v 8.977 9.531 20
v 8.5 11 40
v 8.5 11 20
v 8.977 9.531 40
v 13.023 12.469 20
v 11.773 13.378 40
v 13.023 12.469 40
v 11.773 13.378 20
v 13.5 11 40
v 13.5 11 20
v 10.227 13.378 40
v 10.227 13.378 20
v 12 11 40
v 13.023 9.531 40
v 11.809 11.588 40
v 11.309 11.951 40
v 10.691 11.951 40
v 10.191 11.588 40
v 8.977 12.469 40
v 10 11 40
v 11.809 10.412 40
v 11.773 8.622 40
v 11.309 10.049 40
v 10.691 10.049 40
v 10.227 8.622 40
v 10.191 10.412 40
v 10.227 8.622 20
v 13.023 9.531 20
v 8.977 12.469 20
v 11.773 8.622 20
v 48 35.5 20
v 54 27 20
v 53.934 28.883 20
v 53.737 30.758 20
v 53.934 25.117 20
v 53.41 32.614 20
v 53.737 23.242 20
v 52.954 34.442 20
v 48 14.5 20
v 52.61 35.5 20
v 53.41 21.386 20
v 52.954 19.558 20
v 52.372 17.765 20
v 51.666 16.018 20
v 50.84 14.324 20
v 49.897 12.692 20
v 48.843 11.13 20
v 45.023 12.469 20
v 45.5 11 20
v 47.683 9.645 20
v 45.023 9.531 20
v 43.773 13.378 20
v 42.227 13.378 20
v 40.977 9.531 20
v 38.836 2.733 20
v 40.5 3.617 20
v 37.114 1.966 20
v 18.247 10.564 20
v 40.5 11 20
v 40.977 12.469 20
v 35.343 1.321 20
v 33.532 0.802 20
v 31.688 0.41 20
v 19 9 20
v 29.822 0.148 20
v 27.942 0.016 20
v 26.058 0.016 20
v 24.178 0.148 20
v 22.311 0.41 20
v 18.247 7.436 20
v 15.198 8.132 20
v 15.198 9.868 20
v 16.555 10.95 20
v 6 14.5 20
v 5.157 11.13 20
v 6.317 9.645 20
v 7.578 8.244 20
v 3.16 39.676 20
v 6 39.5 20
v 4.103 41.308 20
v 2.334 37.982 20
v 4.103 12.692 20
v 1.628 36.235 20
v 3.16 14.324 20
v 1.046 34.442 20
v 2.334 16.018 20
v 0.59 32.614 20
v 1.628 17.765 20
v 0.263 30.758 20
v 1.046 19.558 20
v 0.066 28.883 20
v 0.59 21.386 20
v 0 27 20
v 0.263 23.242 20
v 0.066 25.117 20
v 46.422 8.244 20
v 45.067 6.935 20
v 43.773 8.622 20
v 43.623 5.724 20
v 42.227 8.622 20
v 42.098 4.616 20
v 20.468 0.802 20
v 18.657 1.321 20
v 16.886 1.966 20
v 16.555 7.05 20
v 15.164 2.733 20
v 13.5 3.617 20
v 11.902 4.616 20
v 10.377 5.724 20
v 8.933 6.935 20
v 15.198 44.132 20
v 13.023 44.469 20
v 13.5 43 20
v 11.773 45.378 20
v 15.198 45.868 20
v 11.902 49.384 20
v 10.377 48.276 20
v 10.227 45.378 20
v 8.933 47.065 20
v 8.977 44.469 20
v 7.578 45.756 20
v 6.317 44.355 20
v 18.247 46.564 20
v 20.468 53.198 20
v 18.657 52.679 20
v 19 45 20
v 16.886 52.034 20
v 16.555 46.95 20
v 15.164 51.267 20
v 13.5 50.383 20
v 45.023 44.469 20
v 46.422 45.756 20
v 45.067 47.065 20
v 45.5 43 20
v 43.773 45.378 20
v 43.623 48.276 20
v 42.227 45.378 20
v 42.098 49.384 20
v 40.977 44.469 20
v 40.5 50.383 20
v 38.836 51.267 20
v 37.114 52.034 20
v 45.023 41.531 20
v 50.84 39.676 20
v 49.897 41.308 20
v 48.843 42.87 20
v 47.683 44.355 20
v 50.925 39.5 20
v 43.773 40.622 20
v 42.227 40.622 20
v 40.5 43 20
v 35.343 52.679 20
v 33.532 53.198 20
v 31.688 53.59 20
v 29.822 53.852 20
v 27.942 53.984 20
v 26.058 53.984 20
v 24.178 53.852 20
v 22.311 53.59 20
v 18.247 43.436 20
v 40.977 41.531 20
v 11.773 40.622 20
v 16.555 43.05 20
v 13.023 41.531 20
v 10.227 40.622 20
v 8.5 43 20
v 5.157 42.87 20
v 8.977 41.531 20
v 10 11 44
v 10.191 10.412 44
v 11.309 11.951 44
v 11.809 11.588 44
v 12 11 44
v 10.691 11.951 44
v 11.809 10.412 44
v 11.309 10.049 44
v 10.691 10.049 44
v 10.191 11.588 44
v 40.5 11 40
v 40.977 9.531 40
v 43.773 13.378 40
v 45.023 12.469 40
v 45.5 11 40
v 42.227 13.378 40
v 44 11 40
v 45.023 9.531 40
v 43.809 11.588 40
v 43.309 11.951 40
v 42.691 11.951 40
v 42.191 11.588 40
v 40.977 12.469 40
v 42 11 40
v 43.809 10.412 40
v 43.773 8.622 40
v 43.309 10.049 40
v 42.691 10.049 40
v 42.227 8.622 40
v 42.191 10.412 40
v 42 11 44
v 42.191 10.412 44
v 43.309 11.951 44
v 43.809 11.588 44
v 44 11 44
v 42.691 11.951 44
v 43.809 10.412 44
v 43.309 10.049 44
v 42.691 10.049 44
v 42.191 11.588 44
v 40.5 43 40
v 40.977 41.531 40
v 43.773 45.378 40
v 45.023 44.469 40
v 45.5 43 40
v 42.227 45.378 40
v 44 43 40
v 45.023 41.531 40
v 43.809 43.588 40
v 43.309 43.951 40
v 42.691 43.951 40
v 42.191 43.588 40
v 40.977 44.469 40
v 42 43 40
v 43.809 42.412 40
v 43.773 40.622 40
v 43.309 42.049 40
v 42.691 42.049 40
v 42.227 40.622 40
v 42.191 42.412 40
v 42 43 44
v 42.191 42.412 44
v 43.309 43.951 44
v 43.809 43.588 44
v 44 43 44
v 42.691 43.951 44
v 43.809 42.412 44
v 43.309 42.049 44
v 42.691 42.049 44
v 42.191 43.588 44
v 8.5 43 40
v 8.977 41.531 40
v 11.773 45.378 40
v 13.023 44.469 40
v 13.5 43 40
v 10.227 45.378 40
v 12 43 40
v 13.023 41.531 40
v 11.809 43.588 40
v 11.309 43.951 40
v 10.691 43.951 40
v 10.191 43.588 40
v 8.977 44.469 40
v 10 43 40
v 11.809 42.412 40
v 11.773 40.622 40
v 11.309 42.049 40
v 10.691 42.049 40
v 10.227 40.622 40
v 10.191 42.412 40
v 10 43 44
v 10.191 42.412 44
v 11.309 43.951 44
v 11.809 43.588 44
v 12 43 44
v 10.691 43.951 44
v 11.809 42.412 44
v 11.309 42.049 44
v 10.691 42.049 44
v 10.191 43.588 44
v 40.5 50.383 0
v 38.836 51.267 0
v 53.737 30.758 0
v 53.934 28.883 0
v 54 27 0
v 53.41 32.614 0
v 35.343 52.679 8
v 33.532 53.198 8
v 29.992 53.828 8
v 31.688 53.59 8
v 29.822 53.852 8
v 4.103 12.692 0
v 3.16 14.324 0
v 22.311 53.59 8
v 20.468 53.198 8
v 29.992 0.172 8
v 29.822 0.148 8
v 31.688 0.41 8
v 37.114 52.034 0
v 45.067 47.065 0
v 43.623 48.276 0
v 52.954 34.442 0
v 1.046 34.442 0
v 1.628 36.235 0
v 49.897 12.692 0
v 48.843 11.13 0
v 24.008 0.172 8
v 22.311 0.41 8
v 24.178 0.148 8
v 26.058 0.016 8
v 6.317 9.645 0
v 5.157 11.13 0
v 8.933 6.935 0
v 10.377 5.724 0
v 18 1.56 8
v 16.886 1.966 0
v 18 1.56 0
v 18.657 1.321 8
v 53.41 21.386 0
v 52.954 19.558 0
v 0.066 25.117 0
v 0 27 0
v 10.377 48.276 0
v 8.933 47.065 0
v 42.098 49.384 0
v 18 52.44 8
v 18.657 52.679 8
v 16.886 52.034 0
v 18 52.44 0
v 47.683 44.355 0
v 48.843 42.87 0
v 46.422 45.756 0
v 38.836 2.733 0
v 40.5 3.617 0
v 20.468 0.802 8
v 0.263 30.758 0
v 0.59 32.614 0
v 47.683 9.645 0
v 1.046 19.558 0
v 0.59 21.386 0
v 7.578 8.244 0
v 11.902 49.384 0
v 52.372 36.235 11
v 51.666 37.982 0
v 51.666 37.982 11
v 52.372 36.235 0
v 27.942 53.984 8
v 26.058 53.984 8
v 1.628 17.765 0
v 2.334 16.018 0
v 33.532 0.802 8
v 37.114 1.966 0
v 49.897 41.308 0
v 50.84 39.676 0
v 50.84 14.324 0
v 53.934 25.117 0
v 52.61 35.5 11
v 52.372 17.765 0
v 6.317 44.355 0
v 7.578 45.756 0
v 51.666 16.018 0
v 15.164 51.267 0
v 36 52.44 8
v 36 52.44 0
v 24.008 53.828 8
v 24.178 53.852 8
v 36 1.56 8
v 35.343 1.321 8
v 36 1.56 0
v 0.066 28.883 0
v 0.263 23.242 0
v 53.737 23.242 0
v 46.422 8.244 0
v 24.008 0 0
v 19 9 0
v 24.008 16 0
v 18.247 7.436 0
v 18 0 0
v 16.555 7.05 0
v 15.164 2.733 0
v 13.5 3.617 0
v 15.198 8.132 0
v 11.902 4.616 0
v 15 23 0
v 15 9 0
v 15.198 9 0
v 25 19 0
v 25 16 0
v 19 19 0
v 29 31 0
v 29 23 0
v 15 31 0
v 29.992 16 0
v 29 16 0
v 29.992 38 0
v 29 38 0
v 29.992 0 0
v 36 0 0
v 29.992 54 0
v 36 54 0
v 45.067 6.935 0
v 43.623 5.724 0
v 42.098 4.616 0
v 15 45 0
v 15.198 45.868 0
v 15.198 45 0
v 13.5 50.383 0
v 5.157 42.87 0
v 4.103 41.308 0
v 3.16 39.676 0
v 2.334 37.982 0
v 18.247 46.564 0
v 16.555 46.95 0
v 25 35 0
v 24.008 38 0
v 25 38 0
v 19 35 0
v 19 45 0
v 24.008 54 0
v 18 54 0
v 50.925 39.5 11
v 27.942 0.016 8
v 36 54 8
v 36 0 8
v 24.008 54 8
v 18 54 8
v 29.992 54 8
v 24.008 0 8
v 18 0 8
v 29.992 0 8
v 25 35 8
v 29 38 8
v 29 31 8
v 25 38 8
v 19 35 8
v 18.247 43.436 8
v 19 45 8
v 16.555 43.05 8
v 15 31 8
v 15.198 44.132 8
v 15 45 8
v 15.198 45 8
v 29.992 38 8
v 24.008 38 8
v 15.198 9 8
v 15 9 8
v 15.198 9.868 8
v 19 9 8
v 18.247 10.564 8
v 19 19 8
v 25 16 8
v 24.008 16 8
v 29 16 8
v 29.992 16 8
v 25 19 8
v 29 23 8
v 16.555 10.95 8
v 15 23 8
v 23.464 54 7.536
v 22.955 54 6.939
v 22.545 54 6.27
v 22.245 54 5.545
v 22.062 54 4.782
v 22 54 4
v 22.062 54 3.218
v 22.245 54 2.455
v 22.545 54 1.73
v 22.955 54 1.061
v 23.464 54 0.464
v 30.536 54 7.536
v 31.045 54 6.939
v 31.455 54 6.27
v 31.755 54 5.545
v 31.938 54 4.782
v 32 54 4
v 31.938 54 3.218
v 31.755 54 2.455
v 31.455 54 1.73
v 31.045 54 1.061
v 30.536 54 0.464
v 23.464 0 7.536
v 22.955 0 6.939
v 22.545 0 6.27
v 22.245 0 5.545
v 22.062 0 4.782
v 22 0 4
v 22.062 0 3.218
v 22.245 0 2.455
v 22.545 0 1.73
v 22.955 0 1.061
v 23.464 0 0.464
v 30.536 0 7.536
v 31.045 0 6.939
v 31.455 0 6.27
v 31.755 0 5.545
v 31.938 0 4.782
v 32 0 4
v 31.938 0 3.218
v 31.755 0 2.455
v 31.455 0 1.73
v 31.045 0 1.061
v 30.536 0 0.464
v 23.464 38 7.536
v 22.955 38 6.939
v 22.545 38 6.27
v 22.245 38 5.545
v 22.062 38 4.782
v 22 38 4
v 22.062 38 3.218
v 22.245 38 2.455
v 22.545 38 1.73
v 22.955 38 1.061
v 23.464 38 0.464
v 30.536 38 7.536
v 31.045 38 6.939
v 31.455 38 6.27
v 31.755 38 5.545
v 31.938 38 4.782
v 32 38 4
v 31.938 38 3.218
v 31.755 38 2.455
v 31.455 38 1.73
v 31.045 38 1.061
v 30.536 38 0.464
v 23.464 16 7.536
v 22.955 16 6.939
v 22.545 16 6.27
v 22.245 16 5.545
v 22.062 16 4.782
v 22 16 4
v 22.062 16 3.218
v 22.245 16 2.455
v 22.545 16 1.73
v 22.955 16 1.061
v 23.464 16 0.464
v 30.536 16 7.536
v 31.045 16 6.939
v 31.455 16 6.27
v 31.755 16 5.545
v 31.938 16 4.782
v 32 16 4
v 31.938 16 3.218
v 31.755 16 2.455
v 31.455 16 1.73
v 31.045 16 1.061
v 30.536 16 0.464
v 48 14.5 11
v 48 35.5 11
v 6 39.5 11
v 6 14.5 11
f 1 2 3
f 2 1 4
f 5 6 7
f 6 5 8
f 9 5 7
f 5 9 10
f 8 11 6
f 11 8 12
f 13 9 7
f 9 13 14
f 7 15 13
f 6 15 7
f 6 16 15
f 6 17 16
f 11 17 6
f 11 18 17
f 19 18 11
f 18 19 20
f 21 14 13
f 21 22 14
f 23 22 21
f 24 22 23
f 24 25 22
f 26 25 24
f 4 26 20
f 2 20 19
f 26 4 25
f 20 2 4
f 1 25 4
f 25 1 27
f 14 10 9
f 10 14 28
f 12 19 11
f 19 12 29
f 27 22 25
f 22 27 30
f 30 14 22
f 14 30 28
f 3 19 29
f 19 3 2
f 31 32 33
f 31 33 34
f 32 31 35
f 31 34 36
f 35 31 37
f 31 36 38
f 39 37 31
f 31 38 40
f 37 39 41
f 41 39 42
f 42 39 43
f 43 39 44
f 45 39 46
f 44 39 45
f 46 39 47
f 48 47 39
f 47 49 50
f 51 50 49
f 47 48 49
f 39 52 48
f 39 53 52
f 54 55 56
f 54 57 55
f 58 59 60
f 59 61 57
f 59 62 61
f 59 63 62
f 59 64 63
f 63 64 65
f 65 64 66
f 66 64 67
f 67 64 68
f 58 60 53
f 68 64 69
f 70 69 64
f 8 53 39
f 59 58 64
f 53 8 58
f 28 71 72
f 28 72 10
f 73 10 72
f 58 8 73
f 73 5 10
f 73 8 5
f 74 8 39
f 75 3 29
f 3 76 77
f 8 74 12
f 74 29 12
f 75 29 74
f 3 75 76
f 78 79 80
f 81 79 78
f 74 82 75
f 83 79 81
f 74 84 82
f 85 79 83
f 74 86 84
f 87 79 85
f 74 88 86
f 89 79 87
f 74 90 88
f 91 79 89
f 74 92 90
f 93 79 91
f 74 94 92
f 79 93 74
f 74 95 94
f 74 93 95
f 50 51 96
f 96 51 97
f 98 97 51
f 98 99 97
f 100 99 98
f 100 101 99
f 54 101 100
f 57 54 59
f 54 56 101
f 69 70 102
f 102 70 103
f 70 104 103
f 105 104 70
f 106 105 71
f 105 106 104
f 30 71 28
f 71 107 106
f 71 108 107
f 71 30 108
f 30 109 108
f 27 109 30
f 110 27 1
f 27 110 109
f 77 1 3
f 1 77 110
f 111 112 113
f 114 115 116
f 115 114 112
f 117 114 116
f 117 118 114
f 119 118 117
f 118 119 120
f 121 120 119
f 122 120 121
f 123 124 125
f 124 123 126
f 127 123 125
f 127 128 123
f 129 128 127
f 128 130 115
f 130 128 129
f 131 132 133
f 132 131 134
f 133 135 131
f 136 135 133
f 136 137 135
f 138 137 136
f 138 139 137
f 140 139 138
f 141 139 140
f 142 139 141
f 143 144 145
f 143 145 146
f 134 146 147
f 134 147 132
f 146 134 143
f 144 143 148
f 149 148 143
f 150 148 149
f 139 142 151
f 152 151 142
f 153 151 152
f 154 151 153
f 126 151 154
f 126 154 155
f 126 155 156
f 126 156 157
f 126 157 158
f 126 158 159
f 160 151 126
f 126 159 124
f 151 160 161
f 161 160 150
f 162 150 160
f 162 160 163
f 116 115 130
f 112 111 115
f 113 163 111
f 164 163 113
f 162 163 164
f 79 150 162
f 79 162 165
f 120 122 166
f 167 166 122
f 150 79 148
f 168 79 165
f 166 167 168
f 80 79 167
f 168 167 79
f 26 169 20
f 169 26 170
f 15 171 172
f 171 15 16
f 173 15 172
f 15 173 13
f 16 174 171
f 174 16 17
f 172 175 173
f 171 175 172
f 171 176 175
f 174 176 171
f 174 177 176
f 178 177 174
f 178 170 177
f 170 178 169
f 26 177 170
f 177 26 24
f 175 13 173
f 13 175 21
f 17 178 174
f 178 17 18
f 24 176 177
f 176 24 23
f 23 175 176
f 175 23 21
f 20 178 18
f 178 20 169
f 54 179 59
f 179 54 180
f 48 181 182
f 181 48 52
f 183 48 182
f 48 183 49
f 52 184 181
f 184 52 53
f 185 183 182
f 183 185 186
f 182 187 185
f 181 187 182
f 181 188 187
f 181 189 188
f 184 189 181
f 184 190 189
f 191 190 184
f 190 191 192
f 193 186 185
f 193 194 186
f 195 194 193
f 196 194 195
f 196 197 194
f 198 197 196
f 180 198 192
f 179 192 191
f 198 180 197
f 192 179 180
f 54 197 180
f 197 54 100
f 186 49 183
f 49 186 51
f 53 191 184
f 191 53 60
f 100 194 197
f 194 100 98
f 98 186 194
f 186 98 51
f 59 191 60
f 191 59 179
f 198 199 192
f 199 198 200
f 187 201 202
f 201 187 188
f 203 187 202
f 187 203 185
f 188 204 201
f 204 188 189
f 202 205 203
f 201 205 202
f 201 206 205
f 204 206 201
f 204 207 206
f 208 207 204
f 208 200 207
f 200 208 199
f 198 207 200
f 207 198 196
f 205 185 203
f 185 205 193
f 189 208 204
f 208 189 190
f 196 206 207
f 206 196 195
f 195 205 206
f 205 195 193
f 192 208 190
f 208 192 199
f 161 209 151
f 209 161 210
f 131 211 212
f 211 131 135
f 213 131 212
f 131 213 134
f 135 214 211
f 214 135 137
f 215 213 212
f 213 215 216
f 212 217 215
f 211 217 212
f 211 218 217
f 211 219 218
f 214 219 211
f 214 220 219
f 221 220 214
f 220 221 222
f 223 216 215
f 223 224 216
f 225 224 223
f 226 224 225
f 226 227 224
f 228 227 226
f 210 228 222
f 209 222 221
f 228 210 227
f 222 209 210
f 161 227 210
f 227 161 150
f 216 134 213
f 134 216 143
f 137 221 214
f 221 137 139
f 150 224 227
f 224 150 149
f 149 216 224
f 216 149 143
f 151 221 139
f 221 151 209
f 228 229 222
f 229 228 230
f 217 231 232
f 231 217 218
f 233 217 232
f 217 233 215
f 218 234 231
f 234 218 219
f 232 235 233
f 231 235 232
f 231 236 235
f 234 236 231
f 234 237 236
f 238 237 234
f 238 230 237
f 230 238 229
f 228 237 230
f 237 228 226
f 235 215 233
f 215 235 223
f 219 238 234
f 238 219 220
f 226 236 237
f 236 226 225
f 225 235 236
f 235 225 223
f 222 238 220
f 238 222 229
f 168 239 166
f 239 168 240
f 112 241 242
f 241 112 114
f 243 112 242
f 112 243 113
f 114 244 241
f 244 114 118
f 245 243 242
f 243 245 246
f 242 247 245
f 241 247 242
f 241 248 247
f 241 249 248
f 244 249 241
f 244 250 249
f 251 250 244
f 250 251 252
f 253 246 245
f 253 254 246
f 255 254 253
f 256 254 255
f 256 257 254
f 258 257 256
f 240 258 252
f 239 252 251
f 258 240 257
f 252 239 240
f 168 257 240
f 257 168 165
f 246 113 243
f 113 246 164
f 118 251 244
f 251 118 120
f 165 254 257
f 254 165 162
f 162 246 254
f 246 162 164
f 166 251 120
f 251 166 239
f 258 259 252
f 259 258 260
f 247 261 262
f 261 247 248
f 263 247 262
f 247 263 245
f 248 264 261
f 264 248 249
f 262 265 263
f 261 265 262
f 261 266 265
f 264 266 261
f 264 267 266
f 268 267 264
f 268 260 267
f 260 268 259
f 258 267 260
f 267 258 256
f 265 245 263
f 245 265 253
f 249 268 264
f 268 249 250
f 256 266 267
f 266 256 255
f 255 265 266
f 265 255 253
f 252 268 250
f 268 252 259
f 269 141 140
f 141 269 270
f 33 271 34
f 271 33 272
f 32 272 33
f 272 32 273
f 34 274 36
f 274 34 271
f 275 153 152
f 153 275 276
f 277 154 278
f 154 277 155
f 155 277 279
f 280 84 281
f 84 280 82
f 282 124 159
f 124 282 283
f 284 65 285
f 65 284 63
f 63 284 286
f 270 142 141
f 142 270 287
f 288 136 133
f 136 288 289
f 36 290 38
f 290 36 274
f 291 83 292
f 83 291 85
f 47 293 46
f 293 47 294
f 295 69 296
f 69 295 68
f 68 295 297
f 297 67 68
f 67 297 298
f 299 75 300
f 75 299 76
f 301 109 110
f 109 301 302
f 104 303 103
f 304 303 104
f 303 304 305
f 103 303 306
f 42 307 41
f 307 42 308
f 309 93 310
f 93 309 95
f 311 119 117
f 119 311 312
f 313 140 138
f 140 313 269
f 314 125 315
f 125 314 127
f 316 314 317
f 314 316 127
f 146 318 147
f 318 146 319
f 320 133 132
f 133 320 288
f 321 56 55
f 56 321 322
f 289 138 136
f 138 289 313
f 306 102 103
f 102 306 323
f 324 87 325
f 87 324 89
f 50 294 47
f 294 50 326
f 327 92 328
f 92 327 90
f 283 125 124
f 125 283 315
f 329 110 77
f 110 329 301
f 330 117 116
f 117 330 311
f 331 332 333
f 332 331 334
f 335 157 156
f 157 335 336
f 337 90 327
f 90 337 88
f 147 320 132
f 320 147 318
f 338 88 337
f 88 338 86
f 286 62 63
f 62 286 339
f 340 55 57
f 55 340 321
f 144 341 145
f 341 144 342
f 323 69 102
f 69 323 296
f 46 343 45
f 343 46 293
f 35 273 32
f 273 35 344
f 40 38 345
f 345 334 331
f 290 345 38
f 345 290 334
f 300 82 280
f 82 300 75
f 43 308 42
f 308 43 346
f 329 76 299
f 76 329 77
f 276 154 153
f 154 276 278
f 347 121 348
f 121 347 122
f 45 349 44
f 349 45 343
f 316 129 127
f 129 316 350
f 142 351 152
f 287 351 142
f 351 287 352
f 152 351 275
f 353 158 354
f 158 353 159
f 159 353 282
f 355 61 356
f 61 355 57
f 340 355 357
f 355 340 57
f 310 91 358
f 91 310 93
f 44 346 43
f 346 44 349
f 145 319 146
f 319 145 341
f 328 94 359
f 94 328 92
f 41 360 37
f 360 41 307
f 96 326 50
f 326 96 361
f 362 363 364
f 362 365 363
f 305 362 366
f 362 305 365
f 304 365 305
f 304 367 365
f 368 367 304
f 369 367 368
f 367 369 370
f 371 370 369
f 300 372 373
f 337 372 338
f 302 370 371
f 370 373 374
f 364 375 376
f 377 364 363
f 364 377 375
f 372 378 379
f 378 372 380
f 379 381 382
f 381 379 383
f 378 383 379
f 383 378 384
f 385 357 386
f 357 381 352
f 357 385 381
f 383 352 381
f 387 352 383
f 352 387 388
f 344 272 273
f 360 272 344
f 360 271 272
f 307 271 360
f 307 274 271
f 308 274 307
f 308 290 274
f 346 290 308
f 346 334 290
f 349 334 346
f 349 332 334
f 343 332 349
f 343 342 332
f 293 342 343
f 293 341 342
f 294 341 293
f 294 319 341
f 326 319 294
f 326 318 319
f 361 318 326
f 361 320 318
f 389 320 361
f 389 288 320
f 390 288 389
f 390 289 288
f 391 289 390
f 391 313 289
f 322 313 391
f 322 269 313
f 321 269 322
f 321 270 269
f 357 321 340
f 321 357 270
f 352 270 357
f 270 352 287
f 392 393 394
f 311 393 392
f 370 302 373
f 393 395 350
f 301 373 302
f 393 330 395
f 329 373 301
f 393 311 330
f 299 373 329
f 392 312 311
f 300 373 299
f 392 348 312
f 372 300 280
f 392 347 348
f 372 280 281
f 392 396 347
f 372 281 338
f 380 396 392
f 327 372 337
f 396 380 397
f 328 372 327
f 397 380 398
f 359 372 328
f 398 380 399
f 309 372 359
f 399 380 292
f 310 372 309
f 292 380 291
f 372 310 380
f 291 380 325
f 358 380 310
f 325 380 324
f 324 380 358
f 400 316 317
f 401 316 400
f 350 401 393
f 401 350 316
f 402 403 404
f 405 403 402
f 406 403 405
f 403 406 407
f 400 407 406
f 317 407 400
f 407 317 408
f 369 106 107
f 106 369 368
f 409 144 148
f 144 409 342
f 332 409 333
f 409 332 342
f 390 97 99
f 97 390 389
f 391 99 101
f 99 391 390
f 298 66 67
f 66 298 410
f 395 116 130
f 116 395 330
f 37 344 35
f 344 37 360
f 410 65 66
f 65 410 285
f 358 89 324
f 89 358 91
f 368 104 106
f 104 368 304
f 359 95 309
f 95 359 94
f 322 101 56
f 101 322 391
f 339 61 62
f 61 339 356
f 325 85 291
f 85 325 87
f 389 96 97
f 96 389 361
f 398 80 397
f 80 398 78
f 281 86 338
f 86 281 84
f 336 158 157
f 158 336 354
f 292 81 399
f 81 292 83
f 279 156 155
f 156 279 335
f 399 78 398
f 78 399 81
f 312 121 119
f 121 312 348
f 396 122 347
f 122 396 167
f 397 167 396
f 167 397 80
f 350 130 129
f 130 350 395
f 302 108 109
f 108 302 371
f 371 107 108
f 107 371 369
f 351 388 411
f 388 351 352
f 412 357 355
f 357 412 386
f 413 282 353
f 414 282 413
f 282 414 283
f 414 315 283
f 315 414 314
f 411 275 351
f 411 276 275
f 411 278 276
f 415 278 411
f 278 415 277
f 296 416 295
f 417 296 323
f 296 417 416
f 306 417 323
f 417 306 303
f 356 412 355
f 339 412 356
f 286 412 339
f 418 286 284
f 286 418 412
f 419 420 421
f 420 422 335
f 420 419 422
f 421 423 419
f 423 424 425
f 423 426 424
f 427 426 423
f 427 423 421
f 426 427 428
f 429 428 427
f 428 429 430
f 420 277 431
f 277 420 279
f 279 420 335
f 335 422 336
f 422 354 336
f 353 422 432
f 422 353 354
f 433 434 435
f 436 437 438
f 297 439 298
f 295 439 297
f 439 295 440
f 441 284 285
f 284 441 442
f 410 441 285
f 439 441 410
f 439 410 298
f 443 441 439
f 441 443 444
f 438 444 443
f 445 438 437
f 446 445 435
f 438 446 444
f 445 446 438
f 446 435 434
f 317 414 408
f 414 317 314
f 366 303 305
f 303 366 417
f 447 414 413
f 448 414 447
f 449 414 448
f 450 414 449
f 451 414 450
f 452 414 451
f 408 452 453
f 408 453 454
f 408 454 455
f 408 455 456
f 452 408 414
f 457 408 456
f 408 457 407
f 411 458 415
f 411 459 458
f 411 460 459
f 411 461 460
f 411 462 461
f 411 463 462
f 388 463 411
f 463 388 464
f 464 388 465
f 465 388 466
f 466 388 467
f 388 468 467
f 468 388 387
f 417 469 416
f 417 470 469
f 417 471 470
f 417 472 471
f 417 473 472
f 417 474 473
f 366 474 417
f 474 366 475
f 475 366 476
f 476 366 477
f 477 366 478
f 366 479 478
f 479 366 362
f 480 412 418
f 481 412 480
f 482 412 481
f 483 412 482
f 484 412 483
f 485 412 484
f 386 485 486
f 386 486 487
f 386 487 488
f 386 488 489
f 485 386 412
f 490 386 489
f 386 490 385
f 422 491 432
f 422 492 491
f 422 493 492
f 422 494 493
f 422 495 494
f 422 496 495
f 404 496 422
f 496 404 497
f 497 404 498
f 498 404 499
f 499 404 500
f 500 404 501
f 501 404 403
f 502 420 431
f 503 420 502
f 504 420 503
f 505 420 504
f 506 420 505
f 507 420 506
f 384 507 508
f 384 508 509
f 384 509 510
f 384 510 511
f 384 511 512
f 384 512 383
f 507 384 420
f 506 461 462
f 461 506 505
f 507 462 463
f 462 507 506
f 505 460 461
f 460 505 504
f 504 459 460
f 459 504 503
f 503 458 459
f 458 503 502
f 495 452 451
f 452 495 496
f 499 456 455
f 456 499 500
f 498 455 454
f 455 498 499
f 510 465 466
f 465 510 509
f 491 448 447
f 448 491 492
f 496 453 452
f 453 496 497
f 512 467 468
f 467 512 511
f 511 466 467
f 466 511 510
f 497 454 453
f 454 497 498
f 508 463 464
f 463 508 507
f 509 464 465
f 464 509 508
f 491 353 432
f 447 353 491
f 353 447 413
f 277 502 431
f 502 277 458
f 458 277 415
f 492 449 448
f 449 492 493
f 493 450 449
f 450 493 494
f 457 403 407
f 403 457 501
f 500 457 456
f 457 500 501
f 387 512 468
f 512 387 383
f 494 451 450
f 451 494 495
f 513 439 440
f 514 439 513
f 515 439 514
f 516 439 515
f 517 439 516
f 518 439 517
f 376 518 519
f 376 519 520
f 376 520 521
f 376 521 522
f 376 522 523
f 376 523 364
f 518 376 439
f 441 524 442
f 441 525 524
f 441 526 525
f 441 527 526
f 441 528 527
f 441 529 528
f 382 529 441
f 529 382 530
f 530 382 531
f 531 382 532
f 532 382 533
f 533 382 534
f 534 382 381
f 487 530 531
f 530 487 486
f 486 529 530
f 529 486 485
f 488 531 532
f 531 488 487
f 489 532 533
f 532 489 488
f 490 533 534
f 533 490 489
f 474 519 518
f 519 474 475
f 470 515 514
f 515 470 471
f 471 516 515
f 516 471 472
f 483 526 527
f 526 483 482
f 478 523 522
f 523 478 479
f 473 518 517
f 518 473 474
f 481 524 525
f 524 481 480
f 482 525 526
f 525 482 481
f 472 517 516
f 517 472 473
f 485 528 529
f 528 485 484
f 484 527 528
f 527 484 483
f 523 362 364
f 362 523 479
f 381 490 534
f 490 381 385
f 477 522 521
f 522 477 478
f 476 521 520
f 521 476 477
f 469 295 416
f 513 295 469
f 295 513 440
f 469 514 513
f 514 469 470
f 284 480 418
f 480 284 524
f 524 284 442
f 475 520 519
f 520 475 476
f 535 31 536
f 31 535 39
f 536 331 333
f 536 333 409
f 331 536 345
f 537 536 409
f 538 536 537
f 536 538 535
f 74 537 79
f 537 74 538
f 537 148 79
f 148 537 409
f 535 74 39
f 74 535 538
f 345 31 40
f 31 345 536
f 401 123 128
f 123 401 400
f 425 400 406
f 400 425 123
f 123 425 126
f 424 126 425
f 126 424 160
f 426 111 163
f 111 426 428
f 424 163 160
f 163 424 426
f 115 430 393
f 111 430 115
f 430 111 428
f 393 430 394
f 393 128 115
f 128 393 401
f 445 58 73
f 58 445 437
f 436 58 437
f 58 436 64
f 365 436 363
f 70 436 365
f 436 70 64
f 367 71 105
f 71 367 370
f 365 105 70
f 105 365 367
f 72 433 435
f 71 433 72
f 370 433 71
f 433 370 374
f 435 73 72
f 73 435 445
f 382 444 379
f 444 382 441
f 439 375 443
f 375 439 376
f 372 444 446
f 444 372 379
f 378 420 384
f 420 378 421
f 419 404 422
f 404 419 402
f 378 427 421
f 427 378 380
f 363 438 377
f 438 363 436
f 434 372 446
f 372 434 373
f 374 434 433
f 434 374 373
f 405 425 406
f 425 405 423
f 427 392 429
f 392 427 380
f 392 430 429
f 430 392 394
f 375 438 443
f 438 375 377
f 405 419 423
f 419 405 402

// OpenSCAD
difference(){
    base_h = 20;
    base_r = 27;
    union(){
        //base shape
        translate([base_r, base_r, 0]){
            cylinder(r=base_r, h=base_h, $fn=90);
        }
        
        //motor mount block
        translate([base_r-9,0,0]){
            cube([18, base_r*2, 8]);
        }
        
        //LED ring support
        translate([base_r/2-2.5, base_r/2-2.5 ,base_h]){
            led_struts();
        }
    }
    
    //battery cutout
    w = base_r * 2;
    l = base_r * 2;
    translate([(w-42)/2, (l-25)/2, base_h-9]){
        cube([42, 25, 9]);
    }
    translate([w-7, w/2 + 25/2-4, base_h-9]){
        //wire cutout
        cube([8,4,9]);
    }
   
   //motors
    union(){
        translate([base_r, 0,4]){
            translate([0,w,0]){
                rotate([90, 0,0])
                {
                    motor();
                }
            }
            translate([0,0,0]){
                rotate([-90,0,0])
                {
                    motor();
                }
            }
        }
    } 
    
    //Wire holes
    translate([base_r-10,base_r+18,0]){
        cylinder(h=base_h, r=2);
    }
    translate([base_r-10,base_r-18,0]){
        cylinder(h=base_h, r=2);
    }
    
    //Wire channels
    translate([base_r-2, base_r-14,0])
    {
        cube([4,10,8]);
    }
    translate([base_r-2, base_r+4,0])
    {
        cube([4,10,8]);
    }
    translate([base_r-12, base_r-18,0])
    {
        cube([4,14,8]);
    }
    translate([base_r-12, base_r+4,0])
    {
        cube([4,14,8]);
    }
    translate([base_r-12, base_r-8,0])
    {
        cube([14,4,8]);
    }
    translate([base_r-12, base_r+4,0])
    {
        cube([14,4,8]);
    }
    
}

module motor(){
    intersection()
    {
        translate([0,0,8]){
            cube([10, 8, 16], center=true);
        }
        //todo 16 here is a guess
        cylinder(r=5, h=16, $fn=40); 
    }
}

module strut(){
    height=20;
    union(){
    cylinder(h=height, r=2.5, $fn=10);
        translate([0,0,height]){
            cylinder(h=4, r=1, $fn=10);
        }
    }
}

module led_struts(){
    translate([0,0,0]){
        strut();
    }
    translate([32,0,0]){
        strut();
    }
    translate([32,32,0]){
        strut();
    }
    translate([0,32,0]){
        strut();
    }
}
